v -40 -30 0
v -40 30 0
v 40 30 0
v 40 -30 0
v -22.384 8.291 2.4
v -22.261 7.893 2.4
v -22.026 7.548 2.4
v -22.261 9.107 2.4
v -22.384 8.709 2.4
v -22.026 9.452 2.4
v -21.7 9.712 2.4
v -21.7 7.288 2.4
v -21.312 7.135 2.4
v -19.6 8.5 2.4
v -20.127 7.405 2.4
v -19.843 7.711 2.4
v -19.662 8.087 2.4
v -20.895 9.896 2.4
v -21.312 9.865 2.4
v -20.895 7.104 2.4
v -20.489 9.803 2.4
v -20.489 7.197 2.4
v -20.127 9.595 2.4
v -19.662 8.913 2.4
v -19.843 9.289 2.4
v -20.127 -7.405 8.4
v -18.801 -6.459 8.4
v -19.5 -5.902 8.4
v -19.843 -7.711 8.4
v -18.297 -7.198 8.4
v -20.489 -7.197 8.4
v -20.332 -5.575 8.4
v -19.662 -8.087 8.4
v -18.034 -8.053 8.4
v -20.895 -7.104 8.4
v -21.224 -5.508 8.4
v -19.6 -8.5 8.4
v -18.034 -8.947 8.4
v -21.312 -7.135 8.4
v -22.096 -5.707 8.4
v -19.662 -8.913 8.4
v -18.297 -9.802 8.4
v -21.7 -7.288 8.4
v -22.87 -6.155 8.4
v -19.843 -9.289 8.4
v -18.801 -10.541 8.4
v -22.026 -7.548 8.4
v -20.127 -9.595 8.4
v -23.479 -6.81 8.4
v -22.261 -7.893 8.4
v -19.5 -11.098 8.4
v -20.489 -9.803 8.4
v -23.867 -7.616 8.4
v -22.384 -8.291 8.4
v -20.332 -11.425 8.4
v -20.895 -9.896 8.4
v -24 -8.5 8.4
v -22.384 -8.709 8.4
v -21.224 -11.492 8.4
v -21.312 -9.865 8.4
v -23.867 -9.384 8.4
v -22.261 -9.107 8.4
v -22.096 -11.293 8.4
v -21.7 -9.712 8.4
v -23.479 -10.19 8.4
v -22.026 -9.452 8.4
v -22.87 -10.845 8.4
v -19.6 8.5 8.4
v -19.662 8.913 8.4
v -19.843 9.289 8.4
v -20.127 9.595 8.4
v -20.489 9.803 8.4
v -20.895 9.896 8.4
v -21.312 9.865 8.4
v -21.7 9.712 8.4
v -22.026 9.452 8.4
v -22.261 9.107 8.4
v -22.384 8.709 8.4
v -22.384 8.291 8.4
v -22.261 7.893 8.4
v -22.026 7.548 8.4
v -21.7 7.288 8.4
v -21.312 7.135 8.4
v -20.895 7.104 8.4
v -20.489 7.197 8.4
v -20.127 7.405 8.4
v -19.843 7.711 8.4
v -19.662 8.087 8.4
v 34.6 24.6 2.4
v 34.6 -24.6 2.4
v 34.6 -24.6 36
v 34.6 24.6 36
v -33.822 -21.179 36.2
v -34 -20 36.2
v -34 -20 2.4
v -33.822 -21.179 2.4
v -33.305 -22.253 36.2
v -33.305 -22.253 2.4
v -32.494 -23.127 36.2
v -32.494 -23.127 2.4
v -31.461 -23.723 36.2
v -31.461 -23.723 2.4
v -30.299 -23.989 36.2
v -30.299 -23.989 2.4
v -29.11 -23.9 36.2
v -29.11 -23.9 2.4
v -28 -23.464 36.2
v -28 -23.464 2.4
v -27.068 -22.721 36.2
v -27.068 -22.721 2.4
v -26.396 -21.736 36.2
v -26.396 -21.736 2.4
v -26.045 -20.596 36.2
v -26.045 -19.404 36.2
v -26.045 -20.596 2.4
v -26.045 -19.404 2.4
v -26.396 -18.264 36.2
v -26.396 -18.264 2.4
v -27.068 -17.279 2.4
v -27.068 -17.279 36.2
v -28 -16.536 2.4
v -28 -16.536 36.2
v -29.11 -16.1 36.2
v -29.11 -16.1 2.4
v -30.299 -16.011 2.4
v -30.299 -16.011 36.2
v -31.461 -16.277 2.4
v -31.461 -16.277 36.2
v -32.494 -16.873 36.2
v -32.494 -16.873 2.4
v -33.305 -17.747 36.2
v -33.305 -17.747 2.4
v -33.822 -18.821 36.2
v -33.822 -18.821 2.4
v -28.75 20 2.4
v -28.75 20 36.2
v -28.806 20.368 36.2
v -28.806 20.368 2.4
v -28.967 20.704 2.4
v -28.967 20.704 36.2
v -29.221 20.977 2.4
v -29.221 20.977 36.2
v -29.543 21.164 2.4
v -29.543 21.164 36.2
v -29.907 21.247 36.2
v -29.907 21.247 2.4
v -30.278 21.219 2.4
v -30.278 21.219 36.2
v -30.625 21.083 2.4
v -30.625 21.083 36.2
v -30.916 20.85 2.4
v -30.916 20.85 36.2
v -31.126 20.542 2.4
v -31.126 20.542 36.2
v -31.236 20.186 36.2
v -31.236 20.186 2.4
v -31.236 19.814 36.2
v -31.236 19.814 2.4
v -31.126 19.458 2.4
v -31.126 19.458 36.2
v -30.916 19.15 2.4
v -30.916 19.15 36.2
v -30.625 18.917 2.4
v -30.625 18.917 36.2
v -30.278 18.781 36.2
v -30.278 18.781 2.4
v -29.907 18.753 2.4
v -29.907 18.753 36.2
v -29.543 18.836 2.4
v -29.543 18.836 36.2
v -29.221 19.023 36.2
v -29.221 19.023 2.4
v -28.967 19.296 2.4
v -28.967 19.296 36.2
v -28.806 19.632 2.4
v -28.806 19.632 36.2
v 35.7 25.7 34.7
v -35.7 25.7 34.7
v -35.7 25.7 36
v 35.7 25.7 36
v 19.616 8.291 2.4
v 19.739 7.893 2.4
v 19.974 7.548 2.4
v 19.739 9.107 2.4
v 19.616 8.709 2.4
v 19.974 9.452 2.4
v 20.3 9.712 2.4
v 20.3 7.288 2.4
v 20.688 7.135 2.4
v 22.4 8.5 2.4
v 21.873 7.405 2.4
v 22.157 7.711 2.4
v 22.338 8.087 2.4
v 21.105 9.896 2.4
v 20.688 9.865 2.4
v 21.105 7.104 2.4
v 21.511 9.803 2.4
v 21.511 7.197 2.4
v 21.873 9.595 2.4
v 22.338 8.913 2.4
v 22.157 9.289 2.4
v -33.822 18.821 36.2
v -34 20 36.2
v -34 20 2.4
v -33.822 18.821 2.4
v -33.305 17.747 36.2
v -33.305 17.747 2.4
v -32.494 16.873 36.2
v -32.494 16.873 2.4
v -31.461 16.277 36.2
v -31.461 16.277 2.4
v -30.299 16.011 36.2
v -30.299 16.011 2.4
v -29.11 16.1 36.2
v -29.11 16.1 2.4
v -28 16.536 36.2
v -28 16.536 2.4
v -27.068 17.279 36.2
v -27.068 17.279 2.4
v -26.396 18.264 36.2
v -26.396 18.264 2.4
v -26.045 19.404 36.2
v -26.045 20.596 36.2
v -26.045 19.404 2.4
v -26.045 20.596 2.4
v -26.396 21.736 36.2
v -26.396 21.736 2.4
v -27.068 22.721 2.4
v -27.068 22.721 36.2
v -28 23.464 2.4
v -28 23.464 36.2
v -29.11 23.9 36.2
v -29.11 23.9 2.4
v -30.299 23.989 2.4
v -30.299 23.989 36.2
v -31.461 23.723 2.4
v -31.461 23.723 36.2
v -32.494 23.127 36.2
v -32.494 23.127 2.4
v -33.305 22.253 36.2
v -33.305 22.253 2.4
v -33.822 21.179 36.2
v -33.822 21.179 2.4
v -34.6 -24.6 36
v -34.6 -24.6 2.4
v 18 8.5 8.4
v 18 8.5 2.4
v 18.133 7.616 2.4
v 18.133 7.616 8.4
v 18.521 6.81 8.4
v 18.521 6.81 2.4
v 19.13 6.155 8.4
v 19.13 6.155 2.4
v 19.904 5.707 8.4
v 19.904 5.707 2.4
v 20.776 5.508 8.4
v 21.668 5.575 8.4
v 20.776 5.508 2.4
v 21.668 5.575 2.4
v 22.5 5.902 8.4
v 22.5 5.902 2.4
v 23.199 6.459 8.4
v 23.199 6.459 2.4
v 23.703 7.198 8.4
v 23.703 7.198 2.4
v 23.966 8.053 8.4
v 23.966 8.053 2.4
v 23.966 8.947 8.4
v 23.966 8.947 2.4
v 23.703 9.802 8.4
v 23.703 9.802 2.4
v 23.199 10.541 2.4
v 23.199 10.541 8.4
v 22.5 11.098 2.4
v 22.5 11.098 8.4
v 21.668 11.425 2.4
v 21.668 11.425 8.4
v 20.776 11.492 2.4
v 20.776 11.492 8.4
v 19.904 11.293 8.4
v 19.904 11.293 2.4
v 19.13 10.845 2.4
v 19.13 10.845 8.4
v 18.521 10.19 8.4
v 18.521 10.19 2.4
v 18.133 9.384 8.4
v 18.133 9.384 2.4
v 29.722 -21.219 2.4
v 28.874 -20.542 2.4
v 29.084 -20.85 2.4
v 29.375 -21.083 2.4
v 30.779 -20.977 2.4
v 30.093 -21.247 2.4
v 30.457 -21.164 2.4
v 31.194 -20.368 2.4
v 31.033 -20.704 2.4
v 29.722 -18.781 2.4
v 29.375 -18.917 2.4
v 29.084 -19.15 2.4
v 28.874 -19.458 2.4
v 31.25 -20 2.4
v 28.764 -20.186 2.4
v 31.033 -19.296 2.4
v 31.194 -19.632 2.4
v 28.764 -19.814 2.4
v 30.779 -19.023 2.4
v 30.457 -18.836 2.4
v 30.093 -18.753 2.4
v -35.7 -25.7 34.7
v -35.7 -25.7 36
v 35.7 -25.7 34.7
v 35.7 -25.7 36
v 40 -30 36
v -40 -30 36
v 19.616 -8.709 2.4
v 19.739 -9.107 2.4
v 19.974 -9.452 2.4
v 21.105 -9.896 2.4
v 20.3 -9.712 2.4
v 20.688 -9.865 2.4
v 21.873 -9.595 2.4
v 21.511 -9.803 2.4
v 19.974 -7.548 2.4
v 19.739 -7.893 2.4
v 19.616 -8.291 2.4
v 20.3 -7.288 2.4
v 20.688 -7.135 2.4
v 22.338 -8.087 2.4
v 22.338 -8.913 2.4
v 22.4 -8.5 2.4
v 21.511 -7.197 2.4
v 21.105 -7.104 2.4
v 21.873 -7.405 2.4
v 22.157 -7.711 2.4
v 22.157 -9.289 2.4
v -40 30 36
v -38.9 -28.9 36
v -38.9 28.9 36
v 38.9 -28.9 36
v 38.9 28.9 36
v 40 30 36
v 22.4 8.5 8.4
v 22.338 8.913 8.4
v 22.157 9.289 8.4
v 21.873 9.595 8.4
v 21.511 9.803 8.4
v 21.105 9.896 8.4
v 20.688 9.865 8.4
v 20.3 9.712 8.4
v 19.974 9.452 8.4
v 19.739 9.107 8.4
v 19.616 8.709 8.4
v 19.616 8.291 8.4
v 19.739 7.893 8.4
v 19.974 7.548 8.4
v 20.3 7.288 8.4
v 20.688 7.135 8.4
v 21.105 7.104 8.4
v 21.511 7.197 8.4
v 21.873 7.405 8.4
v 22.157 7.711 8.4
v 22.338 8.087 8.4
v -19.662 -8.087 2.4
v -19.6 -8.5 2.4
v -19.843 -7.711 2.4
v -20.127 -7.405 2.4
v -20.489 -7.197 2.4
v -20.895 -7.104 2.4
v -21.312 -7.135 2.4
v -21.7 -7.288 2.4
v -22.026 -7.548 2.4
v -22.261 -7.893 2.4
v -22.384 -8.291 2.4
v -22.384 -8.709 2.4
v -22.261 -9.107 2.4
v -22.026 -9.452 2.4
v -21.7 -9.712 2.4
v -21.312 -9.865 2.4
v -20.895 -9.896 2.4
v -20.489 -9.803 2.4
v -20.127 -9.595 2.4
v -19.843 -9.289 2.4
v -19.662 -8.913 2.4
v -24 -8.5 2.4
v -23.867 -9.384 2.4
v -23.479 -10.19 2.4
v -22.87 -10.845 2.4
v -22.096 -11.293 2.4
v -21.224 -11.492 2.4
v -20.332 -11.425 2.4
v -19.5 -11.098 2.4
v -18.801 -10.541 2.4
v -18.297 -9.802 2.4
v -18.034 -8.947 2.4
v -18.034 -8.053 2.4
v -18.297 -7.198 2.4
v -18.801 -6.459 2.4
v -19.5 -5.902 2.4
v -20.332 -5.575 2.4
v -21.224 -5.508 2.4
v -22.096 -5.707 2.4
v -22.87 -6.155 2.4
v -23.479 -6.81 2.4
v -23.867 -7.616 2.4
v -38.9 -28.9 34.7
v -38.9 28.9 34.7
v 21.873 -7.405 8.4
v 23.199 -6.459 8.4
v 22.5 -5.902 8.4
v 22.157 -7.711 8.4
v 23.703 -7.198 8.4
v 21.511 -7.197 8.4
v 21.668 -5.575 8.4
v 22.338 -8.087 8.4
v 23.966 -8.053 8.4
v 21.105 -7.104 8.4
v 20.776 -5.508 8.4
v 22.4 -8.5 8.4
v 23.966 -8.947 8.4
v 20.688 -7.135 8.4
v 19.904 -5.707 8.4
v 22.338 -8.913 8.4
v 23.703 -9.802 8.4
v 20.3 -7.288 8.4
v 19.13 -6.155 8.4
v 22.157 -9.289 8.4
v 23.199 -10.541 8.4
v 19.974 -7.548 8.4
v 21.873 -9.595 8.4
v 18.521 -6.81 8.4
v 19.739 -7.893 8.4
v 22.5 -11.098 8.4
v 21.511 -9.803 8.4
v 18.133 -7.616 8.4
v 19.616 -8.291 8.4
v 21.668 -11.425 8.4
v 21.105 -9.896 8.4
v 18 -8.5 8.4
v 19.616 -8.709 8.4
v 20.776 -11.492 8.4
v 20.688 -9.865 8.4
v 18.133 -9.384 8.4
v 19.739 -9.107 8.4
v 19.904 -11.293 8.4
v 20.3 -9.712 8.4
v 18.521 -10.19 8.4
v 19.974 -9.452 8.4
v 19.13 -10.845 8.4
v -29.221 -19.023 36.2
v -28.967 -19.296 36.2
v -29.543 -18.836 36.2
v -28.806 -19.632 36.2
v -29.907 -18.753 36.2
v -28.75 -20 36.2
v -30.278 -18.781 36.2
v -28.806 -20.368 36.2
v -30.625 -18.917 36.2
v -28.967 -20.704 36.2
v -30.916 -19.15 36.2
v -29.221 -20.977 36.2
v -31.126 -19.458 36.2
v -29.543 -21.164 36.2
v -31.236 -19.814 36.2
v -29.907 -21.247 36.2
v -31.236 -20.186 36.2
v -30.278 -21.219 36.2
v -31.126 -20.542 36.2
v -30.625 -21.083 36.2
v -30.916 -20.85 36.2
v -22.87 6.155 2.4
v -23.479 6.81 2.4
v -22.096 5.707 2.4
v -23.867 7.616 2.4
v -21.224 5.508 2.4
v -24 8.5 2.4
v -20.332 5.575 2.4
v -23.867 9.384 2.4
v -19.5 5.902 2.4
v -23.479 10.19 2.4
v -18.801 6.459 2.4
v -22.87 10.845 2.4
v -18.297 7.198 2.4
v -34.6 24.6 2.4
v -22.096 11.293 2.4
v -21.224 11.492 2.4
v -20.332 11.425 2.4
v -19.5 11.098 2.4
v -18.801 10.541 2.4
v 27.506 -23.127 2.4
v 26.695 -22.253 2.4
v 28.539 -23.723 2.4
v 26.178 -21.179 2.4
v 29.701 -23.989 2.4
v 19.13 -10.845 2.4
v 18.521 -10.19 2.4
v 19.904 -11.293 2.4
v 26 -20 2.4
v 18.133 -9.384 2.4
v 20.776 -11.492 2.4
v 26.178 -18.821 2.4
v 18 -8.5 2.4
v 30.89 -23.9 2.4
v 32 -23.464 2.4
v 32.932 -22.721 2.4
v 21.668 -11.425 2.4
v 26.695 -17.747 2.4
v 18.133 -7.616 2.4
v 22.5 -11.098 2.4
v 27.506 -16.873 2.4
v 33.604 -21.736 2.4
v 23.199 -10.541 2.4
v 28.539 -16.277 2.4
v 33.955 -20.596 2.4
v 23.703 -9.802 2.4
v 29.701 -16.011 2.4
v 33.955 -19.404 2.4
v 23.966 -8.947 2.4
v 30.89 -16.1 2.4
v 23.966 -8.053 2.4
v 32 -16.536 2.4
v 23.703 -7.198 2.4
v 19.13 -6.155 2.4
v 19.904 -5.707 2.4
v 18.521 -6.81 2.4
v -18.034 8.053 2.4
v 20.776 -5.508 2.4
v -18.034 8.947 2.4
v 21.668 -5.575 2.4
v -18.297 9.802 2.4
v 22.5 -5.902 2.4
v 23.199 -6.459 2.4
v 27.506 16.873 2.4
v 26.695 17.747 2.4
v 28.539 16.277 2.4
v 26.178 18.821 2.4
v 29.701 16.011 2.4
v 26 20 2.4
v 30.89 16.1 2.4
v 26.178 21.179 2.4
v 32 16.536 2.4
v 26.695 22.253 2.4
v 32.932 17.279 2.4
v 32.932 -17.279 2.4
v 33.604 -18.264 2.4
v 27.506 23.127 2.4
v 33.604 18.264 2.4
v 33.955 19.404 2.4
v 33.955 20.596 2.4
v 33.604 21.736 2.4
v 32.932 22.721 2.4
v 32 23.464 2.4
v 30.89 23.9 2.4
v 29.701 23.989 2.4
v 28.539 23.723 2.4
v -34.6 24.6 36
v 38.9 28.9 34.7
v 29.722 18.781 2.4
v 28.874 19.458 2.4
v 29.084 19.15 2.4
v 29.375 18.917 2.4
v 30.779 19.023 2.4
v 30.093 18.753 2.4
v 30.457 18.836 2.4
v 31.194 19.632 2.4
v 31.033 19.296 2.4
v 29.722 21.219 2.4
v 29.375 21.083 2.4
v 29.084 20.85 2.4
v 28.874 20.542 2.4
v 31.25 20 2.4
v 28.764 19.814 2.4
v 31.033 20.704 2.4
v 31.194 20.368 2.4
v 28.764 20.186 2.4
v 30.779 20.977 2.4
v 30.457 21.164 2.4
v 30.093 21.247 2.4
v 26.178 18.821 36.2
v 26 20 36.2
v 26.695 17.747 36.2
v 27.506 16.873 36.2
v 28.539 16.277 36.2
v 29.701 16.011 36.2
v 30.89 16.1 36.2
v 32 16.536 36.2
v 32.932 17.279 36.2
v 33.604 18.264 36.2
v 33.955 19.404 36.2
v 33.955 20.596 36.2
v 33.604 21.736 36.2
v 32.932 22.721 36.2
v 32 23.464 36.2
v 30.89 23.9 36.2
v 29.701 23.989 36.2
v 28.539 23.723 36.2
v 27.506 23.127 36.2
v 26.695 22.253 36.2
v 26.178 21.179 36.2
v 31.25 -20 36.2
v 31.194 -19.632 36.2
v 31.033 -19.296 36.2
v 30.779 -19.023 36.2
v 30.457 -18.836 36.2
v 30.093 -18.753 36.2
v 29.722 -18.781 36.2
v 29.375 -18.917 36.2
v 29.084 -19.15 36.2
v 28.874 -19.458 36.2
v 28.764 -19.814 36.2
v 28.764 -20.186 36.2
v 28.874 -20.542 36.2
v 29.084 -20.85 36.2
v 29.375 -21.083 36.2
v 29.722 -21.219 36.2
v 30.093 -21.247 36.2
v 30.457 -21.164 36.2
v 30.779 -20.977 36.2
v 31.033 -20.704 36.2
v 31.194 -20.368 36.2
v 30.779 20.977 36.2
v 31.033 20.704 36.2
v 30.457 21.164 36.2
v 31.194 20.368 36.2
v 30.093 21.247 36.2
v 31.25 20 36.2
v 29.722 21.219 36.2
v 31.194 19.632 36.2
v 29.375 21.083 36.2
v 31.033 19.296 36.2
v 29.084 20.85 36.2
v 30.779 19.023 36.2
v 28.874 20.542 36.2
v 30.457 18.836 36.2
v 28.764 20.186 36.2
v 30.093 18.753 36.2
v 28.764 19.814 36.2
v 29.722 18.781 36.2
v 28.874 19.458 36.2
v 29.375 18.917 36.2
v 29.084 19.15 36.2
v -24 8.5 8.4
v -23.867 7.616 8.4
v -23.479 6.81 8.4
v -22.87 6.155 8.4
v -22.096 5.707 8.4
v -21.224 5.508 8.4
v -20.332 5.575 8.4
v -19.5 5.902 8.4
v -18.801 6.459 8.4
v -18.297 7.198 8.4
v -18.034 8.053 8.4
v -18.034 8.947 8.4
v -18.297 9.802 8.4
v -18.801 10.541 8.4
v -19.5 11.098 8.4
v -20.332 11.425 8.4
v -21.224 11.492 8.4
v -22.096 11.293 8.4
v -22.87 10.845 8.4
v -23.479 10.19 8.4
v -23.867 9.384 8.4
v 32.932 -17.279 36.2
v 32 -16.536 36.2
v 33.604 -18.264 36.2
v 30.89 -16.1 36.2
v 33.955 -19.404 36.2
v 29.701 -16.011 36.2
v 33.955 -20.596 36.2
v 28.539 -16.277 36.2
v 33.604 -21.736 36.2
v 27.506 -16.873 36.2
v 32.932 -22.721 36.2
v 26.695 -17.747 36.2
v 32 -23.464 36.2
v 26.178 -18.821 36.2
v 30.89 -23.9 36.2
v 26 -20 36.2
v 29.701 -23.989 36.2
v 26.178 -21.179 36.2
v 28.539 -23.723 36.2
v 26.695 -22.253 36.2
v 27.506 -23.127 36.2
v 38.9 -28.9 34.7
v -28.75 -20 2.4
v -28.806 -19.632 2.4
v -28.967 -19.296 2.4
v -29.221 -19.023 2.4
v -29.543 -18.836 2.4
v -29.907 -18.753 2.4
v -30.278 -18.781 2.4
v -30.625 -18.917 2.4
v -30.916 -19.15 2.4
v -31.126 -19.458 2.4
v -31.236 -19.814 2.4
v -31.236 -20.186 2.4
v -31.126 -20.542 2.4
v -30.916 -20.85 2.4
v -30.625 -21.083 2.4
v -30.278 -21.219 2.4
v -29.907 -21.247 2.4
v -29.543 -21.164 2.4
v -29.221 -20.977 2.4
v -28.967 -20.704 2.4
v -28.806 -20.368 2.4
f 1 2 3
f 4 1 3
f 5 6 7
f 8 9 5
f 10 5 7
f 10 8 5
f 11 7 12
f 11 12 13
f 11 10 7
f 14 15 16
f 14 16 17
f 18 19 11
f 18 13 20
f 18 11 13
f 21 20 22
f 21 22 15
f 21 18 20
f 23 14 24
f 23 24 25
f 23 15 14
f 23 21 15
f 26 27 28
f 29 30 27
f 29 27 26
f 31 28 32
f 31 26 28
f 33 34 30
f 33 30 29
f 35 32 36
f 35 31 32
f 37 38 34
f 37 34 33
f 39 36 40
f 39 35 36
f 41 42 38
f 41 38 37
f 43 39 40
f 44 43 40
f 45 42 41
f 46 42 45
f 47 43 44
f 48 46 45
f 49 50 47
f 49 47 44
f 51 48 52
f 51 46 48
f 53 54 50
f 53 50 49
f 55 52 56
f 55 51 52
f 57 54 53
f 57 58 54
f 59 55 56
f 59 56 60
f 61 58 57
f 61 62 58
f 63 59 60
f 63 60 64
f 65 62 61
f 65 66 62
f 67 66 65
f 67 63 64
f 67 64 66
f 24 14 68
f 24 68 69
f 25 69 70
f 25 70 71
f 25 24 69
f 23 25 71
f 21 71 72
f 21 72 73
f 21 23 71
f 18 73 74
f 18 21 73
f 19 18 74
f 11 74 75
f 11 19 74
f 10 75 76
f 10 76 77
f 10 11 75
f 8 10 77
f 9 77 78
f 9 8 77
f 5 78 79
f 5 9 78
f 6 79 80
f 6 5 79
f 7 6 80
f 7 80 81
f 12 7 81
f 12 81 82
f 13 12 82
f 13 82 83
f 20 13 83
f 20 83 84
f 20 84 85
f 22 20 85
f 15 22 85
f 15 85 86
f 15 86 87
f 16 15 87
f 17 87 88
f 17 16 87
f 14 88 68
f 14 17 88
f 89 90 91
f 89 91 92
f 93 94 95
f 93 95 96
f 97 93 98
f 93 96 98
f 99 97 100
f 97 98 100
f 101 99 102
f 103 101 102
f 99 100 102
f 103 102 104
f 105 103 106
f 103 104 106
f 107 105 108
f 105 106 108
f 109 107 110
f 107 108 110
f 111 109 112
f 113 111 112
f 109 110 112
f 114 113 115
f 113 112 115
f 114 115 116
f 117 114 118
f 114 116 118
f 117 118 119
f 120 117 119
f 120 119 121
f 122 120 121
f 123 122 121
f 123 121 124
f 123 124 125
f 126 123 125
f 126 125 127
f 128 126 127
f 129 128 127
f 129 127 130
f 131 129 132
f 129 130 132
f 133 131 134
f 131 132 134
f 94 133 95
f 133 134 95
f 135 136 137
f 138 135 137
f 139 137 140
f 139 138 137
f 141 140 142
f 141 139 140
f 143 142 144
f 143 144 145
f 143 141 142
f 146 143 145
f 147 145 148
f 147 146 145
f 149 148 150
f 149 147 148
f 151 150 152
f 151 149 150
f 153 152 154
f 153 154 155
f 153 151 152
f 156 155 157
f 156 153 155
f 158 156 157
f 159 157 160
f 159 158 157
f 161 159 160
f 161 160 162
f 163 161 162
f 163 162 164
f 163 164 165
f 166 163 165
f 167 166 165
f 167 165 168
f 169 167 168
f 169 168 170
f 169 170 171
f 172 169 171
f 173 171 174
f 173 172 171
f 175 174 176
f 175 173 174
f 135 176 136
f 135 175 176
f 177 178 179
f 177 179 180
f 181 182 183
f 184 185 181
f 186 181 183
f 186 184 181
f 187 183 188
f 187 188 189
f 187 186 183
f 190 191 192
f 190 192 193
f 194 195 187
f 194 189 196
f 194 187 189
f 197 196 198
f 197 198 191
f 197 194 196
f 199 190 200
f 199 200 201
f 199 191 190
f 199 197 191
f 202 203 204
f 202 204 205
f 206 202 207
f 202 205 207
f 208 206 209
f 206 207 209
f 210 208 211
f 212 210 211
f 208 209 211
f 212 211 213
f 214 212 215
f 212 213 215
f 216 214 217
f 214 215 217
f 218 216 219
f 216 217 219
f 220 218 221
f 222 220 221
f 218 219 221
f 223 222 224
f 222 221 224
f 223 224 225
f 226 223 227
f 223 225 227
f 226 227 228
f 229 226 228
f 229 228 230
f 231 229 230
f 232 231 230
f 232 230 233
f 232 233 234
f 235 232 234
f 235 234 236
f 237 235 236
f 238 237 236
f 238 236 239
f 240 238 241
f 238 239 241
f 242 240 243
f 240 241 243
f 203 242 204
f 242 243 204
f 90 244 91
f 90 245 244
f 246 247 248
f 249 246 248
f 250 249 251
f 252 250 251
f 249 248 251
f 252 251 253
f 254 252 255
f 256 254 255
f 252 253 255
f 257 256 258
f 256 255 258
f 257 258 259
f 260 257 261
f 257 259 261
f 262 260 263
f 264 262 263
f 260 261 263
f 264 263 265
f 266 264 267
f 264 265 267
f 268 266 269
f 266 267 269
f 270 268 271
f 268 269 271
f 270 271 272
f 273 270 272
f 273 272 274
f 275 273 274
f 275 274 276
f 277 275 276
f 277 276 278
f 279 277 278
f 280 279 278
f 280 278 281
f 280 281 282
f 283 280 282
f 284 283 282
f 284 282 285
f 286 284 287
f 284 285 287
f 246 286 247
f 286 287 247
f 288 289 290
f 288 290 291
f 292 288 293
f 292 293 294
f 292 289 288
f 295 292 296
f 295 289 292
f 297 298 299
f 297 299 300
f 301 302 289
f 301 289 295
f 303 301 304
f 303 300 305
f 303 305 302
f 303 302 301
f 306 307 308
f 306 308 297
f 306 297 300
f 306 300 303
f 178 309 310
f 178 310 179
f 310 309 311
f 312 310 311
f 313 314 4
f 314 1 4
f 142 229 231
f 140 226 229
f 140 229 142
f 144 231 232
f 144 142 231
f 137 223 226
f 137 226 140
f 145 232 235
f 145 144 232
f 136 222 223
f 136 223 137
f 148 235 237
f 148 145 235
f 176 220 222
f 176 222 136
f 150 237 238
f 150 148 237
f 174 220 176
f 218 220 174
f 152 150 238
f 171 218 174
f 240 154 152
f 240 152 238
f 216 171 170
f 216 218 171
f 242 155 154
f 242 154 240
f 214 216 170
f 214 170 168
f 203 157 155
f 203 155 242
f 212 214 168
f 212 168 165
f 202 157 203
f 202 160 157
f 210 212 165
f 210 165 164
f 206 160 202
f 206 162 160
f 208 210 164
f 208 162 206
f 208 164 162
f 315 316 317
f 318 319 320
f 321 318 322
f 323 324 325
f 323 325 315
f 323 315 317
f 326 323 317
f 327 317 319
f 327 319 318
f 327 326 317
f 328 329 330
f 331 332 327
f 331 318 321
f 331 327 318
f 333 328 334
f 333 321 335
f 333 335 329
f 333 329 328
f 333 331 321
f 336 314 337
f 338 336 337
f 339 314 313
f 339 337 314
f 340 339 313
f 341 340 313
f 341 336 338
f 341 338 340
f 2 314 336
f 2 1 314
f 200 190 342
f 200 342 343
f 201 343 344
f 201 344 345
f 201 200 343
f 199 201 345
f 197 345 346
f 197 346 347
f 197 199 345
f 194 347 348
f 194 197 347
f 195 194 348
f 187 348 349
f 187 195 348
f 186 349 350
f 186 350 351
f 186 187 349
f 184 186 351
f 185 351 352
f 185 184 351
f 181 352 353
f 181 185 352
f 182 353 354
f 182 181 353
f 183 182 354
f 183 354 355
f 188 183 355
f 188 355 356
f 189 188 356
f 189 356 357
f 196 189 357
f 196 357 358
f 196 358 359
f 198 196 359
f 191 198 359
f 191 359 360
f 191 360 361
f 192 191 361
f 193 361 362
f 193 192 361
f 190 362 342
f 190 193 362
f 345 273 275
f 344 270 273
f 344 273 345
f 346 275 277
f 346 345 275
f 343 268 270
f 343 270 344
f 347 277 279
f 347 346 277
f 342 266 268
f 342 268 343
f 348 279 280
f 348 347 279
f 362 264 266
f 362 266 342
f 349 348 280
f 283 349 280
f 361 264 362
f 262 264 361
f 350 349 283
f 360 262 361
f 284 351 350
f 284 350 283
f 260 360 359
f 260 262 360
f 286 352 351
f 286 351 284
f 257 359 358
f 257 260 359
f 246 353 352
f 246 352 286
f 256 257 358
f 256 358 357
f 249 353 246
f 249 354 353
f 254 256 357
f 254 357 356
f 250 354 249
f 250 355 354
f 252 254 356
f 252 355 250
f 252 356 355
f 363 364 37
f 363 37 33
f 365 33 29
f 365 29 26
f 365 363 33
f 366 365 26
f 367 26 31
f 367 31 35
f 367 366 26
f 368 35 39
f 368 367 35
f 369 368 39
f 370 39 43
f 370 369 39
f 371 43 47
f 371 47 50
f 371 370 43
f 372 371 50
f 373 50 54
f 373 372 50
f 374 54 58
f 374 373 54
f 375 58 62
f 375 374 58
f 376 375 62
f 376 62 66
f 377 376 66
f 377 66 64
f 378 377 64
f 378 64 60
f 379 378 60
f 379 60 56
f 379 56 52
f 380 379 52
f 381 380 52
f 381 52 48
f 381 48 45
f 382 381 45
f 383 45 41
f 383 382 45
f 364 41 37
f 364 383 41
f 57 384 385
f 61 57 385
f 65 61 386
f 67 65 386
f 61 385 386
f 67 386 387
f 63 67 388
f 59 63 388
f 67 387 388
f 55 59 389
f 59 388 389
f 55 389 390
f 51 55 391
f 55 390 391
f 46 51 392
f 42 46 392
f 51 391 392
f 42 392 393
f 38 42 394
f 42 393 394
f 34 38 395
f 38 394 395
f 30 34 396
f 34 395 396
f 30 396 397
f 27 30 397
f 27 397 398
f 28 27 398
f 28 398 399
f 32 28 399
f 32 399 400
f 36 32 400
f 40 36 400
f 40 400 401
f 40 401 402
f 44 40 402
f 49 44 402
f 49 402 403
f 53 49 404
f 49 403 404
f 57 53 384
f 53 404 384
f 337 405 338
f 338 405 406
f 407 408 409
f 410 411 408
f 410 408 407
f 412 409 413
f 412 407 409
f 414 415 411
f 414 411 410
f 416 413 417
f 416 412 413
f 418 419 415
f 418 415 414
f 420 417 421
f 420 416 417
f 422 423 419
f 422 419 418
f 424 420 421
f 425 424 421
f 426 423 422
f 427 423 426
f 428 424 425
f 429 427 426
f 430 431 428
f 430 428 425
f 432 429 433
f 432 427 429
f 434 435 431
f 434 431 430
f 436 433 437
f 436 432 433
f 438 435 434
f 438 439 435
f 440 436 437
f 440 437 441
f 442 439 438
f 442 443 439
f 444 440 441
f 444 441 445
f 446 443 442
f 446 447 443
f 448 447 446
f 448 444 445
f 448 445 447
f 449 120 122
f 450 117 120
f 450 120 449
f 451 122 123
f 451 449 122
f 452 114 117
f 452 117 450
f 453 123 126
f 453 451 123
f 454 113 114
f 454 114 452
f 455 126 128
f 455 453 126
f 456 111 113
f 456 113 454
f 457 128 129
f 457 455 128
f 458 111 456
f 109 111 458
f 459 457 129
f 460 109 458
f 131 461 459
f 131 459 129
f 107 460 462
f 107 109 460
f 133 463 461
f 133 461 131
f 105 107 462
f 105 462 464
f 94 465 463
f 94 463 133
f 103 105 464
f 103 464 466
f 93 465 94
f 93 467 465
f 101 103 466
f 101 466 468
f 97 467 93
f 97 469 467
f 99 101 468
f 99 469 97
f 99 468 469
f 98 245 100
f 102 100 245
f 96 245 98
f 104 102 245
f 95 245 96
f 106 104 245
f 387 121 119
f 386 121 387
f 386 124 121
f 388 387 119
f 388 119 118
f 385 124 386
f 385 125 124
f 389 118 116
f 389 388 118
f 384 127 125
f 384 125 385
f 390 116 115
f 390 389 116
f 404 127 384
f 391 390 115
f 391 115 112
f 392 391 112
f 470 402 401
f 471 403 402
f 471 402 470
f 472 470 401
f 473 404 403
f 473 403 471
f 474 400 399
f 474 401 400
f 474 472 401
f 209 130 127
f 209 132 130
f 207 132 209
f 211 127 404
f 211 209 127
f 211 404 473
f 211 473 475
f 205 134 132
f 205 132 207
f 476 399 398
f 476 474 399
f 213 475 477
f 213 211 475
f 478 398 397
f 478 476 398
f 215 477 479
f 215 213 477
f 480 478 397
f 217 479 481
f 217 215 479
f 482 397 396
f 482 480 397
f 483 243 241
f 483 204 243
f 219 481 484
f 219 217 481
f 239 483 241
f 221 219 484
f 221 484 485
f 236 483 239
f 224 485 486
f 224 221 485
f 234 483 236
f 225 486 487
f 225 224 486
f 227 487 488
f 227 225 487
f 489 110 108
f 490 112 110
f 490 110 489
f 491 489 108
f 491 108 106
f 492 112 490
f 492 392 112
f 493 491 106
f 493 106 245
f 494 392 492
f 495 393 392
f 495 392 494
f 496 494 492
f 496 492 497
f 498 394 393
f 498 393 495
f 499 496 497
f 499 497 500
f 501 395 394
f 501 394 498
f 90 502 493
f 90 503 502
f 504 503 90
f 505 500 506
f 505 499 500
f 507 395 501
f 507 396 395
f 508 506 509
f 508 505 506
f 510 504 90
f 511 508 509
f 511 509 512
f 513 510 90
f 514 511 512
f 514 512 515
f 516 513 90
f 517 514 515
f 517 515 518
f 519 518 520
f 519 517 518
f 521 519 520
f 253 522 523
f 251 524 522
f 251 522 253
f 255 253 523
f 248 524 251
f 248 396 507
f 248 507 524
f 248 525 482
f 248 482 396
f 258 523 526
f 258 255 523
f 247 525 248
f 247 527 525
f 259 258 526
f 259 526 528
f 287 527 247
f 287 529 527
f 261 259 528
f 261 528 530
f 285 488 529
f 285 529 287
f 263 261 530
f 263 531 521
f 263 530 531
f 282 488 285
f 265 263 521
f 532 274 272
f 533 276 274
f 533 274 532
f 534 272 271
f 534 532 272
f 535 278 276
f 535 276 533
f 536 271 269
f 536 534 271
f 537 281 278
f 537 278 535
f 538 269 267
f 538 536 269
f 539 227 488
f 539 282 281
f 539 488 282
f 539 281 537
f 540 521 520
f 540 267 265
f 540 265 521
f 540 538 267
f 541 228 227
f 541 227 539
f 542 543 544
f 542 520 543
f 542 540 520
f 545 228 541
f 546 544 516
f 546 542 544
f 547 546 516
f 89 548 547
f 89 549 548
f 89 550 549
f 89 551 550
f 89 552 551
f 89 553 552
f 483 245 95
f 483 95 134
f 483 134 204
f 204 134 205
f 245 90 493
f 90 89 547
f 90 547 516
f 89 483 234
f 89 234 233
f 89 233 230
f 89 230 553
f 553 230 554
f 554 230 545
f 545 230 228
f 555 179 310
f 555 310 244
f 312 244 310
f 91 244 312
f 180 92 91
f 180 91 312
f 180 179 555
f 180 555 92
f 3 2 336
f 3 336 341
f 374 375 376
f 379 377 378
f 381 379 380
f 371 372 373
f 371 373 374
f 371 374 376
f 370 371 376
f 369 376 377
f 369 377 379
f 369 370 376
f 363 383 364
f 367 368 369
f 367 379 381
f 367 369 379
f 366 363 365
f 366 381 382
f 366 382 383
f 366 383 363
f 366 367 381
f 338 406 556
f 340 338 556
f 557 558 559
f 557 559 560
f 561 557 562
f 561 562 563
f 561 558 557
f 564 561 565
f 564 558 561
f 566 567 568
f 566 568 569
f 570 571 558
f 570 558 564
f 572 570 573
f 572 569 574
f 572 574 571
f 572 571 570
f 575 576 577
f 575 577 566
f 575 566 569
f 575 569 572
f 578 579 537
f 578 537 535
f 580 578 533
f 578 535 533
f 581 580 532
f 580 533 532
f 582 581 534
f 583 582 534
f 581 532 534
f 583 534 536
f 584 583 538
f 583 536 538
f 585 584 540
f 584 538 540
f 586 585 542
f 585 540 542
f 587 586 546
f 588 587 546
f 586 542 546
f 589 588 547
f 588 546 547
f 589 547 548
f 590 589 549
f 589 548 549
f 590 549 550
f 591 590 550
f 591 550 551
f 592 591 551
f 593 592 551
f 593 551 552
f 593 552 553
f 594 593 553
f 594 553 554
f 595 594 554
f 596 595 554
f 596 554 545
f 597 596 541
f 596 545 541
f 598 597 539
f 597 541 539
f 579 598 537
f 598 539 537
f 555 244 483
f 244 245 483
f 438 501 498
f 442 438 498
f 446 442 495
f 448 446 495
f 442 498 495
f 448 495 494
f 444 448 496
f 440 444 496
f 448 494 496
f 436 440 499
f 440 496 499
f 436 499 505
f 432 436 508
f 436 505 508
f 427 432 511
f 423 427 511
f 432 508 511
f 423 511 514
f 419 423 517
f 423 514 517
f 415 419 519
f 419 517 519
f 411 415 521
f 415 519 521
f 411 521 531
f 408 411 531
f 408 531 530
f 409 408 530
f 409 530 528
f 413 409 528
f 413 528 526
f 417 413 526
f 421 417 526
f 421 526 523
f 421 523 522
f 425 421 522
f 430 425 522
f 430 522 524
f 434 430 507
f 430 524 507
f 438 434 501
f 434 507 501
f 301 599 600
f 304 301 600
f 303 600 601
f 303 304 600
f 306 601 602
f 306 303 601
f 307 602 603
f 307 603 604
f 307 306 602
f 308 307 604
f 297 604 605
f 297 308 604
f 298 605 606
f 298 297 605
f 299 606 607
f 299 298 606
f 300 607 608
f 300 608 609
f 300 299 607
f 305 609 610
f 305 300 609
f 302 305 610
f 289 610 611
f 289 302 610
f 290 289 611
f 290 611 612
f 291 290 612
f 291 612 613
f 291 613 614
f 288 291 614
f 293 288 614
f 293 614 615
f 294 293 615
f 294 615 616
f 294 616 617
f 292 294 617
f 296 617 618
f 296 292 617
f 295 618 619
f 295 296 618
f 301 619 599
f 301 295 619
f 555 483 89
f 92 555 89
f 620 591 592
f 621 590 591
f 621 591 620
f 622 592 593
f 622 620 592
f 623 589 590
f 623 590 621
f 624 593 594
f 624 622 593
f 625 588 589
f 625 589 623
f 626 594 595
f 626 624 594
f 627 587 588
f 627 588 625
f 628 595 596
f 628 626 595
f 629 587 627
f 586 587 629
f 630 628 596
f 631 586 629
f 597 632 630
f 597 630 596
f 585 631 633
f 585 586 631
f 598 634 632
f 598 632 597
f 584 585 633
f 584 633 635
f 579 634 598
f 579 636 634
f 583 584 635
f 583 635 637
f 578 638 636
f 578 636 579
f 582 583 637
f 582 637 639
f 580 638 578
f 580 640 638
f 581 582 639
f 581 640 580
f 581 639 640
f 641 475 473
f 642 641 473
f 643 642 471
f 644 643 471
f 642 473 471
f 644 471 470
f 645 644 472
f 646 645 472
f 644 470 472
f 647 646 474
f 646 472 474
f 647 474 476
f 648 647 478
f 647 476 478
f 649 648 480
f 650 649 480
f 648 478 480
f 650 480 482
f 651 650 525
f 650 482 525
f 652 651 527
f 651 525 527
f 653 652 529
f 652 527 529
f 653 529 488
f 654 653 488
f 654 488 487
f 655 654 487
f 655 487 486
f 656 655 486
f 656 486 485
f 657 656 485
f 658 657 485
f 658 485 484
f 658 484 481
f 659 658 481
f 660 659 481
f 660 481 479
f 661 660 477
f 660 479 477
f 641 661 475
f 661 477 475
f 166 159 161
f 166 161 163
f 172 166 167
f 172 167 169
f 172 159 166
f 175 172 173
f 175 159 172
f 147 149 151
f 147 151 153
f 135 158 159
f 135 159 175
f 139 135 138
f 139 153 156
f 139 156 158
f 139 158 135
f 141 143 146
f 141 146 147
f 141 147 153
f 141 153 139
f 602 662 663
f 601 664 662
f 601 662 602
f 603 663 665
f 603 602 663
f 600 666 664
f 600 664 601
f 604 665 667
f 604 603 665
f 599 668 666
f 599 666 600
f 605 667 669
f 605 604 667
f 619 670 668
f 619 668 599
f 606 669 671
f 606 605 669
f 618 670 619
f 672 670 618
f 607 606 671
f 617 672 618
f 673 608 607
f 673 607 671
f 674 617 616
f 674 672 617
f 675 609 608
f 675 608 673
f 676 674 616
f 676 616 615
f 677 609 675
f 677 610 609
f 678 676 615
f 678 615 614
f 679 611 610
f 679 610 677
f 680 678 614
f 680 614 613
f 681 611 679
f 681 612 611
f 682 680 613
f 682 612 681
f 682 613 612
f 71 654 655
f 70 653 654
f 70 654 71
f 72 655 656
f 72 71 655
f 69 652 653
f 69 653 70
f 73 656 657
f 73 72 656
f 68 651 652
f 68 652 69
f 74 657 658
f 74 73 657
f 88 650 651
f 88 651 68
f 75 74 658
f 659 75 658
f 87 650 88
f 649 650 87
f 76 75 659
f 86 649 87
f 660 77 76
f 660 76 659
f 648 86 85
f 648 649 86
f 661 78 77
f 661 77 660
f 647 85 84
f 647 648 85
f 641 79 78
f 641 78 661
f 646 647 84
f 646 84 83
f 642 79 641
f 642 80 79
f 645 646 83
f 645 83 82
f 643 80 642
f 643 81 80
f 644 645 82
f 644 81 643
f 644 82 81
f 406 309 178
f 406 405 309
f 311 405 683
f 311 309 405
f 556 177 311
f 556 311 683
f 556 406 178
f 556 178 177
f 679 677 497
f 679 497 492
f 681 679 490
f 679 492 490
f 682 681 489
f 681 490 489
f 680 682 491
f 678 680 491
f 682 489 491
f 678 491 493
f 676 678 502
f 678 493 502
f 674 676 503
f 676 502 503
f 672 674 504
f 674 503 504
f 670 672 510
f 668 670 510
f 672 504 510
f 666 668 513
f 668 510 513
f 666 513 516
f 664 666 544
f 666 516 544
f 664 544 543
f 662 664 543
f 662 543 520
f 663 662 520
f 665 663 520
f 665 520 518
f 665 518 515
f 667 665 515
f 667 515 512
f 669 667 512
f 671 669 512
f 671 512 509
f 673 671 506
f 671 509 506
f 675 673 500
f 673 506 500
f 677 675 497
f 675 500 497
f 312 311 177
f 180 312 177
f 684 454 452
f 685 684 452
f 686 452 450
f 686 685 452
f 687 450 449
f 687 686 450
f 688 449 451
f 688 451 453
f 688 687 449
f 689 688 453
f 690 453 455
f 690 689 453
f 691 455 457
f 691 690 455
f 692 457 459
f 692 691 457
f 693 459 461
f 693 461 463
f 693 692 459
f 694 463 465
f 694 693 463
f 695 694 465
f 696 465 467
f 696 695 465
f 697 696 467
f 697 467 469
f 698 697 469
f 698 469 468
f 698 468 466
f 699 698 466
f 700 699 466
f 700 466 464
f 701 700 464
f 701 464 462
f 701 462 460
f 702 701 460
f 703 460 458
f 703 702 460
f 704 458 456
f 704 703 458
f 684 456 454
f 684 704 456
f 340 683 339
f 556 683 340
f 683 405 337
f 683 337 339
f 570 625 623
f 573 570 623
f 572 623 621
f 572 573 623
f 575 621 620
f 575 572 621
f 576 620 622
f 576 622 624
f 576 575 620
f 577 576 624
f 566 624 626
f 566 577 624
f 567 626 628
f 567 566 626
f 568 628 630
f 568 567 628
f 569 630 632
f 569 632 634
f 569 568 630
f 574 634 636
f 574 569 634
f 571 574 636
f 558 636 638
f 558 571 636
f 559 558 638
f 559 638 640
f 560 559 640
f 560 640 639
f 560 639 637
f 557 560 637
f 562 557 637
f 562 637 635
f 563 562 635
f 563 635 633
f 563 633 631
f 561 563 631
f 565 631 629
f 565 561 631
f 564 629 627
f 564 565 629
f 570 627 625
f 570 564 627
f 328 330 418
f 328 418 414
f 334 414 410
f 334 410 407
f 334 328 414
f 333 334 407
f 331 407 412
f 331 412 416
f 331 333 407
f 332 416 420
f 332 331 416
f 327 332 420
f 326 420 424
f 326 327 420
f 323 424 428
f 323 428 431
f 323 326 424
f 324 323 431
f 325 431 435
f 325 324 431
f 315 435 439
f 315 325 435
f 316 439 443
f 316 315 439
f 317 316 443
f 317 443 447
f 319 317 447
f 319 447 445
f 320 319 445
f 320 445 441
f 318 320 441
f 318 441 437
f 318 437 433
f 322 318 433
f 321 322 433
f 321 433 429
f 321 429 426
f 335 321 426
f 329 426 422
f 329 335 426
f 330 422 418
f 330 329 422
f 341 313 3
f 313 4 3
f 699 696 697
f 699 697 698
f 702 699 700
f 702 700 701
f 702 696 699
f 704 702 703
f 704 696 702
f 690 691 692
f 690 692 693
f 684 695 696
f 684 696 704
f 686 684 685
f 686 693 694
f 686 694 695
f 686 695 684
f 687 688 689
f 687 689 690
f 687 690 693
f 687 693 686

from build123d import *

# Parameters (mm, degrees)
SKETCH2_W              = 80
SKETCH2_H              = 60
FLOOR_2_DEPTH          = 2.4
LOWER_WALLS_START      = 2.4
SKETCH3_W              = 80
SKETCH3_H              = 60
SKETCH3_W_2            = 69.2
SKETCH3_H_2            = 49.2
LOWER_WALLS_DEPTH      = 32.3
OUTER_GROOVE_LIP_START = 34.7
SKETCH4_W              = 80
SKETCH4_H              = 60
SKETCH4_W_2            = 77.8
SKETCH4_H_2            = 57.8
OUTER_GROOVE_LIP_DEPTH = 1.3
INNER_GROOVE_LIP_START = 34.7
SKETCH5_W              = 71.4
SKETCH5_H              = 51.4
SKETCH5_W_2            = 69.2
SKETCH5_H_2            = 49.2
INNER_GROOVE_LIP_DEPTH = 1.3
SCREW_BOSS_START       = 2.4
SKETCH6_R              = 4
SKETCH6_R_2            = 1.25
SCREW_BOSS_DEPTH       = 33.8
BOSS_EXTRUDE6_START    = 2.4
SKETCH7_R              = 4
SKETCH7_R_2            = 1.25
BOSS_EXTRUDE6_DEPTH    = 33.8
BOSS_EXTRUDE7_START    = 2.4
SKETCH8_R              = 4
SKETCH8_R_2            = 1.25
BOSS_EXTRUDE7_DEPTH    = 33.8
BOSS_EXTRUDE8_START    = 2.4
SKETCH9_R              = 4
SKETCH9_R_2            = 1.25
BOSS_EXTRUDE8_DEPTH    = 33.8
PCB_POST_START         = 2.4
SKETCH10_R             = 3
SKETCH10_R_2           = 1.4
PCB_POST_DEPTH         = 6
BOSS_EXTRUDE10_START   = 2.4
SKETCH11_R             = 3
SKETCH11_R_2           = 1.4
BOSS_EXTRUDE10_DEPTH   = 6
BOSS_EXTRUDE11_START   = 2.4
SKETCH12_R             = 3
SKETCH12_R_2           = 1.4
BOSS_EXTRUDE11_DEPTH   = 6
BOSS_EXTRUDE12_START   = 2.4
SKETCH13_R             = 3
SKETCH13_R_2           = 1.4
BOSS_EXTRUDE12_DEPTH   = 6


with BuildPart() as part:
    # Sketch2 → Floor 2 (new body)
    with BuildSketch(Plane.XY):
        Rectangle(SKETCH2_W, SKETCH2_H)
    extrude(amount=FLOOR_2_DEPTH)

    # Sketch3 → Lower_walls (add)
    with BuildSketch(Plane.XY.offset(LOWER_WALLS_START)):
        Rectangle(SKETCH3_W, SKETCH3_H)
        Rectangle(SKETCH3_W_2, SKETCH3_H_2, mode=Mode.SUBTRACT)
    extrude(amount=LOWER_WALLS_DEPTH)

    # Sketch4 → Outer_groove_lip (add)
    with BuildSketch(Plane.XY.offset(OUTER_GROOVE_LIP_START)):
        Rectangle(SKETCH4_W, SKETCH4_H)
        Rectangle(SKETCH4_W_2, SKETCH4_H_2, mode=Mode.SUBTRACT)
    extrude(amount=OUTER_GROOVE_LIP_DEPTH)

    # Sketch5 → Inner_groove_lip (add)
    with BuildSketch(Plane.XY.offset(INNER_GROOVE_LIP_START)):
        Rectangle(SKETCH5_W, SKETCH5_H)
        Rectangle(SKETCH5_W_2, SKETCH5_H_2, mode=Mode.SUBTRACT)
    extrude(amount=INNER_GROOVE_LIP_DEPTH)

    # Sketch6 → Screw_boss (add)
    with BuildSketch(Plane.XY.offset(SCREW_BOSS_START)):
        with Locations(Location((-30, -20, 0), (0, 0, 180))):
            Circle(SKETCH6_R)
        with Locations((-30, -20)):
            Circle(SKETCH6_R_2, mode=Mode.SUBTRACT)
    extrude(amount=SCREW_BOSS_DEPTH)

    # Sketch7 → Boss-Extrude6 (add)
    with BuildSketch(Plane.XY.offset(BOSS_EXTRUDE6_START)):
        with Locations(Location((-30, 20, 0), (0, 0, 180))):
            Circle(SKETCH7_R)
        with Locations((-30, 20)):
            Circle(SKETCH7_R_2, mode=Mode.SUBTRACT)
    extrude(amount=BOSS_EXTRUDE6_DEPTH)

    # Sketch8 → Boss-Extrude7 (add)
    with BuildSketch(Plane.XY.offset(BOSS_EXTRUDE7_START)):
        with Locations(Location((30, -20, 0), (0, 0, 180))):
            Circle(SKETCH8_R)
        with Locations((30, -20)):
            Circle(SKETCH8_R_2, mode=Mode.SUBTRACT)
    extrude(amount=BOSS_EXTRUDE7_DEPTH)

    # Sketch9 → Boss-Extrude8 (add)
    with BuildSketch(Plane.XY.offset(BOSS_EXTRUDE8_START)):
        with Locations(Location((30, 20, 0), (0, 0, 180))):
            Circle(SKETCH9_R)
        with Locations((30, 20)):
            Circle(SKETCH9_R_2, mode=Mode.SUBTRACT)
    extrude(amount=BOSS_EXTRUDE8_DEPTH)

    # Sketch10 → PCB_post (add)
    with BuildSketch(Plane.XY.offset(PCB_POST_START)):
        with Locations(Location((-21, -8.5, 0), (0, 0, 180))):
            Circle(SKETCH10_R)
        with Locations((-21, -8.5)):
            Circle(SKETCH10_R_2, mode=Mode.SUBTRACT)
    extrude(amount=PCB_POST_DEPTH)

    # Sketch11 → Boss-Extrude10 (add)
    with BuildSketch(Plane.XY.offset(BOSS_EXTRUDE10_START)):
        with Locations(Location((-21, 8.5, 0), (0, 0, 180))):
            Circle(SKETCH11_R)
        with Locations((-21, 8.5)):
            Circle(SKETCH11_R_2, mode=Mode.SUBTRACT)
    extrude(amount=BOSS_EXTRUDE10_DEPTH)

    # Sketch12 → Boss-Extrude11 (add)
    with BuildSketch(Plane.XY.offset(BOSS_EXTRUDE11_START)):
        with Locations(Location((21, -8.5, 0), (0, 0, 180))):
            Circle(SKETCH12_R)
        with Locations((21, -8.5)):
            Circle(SKETCH12_R_2, mode=Mode.SUBTRACT)
    extrude(amount=BOSS_EXTRUDE11_DEPTH)

    # Sketch13 → Boss-Extrude12 (add)
    with BuildSketch(Plane.XY.offset(BOSS_EXTRUDE12_START)):
        with Locations(Location((21, 8.5, 0), (0, 0, 180))):
            Circle(SKETCH13_R)
        with Locations((21, 8.5)):
            Circle(SKETCH13_R_2, mode=Mode.SUBTRACT)
    extrude(amount=BOSS_EXTRUDE12_DEPTH)


solid = part.part
